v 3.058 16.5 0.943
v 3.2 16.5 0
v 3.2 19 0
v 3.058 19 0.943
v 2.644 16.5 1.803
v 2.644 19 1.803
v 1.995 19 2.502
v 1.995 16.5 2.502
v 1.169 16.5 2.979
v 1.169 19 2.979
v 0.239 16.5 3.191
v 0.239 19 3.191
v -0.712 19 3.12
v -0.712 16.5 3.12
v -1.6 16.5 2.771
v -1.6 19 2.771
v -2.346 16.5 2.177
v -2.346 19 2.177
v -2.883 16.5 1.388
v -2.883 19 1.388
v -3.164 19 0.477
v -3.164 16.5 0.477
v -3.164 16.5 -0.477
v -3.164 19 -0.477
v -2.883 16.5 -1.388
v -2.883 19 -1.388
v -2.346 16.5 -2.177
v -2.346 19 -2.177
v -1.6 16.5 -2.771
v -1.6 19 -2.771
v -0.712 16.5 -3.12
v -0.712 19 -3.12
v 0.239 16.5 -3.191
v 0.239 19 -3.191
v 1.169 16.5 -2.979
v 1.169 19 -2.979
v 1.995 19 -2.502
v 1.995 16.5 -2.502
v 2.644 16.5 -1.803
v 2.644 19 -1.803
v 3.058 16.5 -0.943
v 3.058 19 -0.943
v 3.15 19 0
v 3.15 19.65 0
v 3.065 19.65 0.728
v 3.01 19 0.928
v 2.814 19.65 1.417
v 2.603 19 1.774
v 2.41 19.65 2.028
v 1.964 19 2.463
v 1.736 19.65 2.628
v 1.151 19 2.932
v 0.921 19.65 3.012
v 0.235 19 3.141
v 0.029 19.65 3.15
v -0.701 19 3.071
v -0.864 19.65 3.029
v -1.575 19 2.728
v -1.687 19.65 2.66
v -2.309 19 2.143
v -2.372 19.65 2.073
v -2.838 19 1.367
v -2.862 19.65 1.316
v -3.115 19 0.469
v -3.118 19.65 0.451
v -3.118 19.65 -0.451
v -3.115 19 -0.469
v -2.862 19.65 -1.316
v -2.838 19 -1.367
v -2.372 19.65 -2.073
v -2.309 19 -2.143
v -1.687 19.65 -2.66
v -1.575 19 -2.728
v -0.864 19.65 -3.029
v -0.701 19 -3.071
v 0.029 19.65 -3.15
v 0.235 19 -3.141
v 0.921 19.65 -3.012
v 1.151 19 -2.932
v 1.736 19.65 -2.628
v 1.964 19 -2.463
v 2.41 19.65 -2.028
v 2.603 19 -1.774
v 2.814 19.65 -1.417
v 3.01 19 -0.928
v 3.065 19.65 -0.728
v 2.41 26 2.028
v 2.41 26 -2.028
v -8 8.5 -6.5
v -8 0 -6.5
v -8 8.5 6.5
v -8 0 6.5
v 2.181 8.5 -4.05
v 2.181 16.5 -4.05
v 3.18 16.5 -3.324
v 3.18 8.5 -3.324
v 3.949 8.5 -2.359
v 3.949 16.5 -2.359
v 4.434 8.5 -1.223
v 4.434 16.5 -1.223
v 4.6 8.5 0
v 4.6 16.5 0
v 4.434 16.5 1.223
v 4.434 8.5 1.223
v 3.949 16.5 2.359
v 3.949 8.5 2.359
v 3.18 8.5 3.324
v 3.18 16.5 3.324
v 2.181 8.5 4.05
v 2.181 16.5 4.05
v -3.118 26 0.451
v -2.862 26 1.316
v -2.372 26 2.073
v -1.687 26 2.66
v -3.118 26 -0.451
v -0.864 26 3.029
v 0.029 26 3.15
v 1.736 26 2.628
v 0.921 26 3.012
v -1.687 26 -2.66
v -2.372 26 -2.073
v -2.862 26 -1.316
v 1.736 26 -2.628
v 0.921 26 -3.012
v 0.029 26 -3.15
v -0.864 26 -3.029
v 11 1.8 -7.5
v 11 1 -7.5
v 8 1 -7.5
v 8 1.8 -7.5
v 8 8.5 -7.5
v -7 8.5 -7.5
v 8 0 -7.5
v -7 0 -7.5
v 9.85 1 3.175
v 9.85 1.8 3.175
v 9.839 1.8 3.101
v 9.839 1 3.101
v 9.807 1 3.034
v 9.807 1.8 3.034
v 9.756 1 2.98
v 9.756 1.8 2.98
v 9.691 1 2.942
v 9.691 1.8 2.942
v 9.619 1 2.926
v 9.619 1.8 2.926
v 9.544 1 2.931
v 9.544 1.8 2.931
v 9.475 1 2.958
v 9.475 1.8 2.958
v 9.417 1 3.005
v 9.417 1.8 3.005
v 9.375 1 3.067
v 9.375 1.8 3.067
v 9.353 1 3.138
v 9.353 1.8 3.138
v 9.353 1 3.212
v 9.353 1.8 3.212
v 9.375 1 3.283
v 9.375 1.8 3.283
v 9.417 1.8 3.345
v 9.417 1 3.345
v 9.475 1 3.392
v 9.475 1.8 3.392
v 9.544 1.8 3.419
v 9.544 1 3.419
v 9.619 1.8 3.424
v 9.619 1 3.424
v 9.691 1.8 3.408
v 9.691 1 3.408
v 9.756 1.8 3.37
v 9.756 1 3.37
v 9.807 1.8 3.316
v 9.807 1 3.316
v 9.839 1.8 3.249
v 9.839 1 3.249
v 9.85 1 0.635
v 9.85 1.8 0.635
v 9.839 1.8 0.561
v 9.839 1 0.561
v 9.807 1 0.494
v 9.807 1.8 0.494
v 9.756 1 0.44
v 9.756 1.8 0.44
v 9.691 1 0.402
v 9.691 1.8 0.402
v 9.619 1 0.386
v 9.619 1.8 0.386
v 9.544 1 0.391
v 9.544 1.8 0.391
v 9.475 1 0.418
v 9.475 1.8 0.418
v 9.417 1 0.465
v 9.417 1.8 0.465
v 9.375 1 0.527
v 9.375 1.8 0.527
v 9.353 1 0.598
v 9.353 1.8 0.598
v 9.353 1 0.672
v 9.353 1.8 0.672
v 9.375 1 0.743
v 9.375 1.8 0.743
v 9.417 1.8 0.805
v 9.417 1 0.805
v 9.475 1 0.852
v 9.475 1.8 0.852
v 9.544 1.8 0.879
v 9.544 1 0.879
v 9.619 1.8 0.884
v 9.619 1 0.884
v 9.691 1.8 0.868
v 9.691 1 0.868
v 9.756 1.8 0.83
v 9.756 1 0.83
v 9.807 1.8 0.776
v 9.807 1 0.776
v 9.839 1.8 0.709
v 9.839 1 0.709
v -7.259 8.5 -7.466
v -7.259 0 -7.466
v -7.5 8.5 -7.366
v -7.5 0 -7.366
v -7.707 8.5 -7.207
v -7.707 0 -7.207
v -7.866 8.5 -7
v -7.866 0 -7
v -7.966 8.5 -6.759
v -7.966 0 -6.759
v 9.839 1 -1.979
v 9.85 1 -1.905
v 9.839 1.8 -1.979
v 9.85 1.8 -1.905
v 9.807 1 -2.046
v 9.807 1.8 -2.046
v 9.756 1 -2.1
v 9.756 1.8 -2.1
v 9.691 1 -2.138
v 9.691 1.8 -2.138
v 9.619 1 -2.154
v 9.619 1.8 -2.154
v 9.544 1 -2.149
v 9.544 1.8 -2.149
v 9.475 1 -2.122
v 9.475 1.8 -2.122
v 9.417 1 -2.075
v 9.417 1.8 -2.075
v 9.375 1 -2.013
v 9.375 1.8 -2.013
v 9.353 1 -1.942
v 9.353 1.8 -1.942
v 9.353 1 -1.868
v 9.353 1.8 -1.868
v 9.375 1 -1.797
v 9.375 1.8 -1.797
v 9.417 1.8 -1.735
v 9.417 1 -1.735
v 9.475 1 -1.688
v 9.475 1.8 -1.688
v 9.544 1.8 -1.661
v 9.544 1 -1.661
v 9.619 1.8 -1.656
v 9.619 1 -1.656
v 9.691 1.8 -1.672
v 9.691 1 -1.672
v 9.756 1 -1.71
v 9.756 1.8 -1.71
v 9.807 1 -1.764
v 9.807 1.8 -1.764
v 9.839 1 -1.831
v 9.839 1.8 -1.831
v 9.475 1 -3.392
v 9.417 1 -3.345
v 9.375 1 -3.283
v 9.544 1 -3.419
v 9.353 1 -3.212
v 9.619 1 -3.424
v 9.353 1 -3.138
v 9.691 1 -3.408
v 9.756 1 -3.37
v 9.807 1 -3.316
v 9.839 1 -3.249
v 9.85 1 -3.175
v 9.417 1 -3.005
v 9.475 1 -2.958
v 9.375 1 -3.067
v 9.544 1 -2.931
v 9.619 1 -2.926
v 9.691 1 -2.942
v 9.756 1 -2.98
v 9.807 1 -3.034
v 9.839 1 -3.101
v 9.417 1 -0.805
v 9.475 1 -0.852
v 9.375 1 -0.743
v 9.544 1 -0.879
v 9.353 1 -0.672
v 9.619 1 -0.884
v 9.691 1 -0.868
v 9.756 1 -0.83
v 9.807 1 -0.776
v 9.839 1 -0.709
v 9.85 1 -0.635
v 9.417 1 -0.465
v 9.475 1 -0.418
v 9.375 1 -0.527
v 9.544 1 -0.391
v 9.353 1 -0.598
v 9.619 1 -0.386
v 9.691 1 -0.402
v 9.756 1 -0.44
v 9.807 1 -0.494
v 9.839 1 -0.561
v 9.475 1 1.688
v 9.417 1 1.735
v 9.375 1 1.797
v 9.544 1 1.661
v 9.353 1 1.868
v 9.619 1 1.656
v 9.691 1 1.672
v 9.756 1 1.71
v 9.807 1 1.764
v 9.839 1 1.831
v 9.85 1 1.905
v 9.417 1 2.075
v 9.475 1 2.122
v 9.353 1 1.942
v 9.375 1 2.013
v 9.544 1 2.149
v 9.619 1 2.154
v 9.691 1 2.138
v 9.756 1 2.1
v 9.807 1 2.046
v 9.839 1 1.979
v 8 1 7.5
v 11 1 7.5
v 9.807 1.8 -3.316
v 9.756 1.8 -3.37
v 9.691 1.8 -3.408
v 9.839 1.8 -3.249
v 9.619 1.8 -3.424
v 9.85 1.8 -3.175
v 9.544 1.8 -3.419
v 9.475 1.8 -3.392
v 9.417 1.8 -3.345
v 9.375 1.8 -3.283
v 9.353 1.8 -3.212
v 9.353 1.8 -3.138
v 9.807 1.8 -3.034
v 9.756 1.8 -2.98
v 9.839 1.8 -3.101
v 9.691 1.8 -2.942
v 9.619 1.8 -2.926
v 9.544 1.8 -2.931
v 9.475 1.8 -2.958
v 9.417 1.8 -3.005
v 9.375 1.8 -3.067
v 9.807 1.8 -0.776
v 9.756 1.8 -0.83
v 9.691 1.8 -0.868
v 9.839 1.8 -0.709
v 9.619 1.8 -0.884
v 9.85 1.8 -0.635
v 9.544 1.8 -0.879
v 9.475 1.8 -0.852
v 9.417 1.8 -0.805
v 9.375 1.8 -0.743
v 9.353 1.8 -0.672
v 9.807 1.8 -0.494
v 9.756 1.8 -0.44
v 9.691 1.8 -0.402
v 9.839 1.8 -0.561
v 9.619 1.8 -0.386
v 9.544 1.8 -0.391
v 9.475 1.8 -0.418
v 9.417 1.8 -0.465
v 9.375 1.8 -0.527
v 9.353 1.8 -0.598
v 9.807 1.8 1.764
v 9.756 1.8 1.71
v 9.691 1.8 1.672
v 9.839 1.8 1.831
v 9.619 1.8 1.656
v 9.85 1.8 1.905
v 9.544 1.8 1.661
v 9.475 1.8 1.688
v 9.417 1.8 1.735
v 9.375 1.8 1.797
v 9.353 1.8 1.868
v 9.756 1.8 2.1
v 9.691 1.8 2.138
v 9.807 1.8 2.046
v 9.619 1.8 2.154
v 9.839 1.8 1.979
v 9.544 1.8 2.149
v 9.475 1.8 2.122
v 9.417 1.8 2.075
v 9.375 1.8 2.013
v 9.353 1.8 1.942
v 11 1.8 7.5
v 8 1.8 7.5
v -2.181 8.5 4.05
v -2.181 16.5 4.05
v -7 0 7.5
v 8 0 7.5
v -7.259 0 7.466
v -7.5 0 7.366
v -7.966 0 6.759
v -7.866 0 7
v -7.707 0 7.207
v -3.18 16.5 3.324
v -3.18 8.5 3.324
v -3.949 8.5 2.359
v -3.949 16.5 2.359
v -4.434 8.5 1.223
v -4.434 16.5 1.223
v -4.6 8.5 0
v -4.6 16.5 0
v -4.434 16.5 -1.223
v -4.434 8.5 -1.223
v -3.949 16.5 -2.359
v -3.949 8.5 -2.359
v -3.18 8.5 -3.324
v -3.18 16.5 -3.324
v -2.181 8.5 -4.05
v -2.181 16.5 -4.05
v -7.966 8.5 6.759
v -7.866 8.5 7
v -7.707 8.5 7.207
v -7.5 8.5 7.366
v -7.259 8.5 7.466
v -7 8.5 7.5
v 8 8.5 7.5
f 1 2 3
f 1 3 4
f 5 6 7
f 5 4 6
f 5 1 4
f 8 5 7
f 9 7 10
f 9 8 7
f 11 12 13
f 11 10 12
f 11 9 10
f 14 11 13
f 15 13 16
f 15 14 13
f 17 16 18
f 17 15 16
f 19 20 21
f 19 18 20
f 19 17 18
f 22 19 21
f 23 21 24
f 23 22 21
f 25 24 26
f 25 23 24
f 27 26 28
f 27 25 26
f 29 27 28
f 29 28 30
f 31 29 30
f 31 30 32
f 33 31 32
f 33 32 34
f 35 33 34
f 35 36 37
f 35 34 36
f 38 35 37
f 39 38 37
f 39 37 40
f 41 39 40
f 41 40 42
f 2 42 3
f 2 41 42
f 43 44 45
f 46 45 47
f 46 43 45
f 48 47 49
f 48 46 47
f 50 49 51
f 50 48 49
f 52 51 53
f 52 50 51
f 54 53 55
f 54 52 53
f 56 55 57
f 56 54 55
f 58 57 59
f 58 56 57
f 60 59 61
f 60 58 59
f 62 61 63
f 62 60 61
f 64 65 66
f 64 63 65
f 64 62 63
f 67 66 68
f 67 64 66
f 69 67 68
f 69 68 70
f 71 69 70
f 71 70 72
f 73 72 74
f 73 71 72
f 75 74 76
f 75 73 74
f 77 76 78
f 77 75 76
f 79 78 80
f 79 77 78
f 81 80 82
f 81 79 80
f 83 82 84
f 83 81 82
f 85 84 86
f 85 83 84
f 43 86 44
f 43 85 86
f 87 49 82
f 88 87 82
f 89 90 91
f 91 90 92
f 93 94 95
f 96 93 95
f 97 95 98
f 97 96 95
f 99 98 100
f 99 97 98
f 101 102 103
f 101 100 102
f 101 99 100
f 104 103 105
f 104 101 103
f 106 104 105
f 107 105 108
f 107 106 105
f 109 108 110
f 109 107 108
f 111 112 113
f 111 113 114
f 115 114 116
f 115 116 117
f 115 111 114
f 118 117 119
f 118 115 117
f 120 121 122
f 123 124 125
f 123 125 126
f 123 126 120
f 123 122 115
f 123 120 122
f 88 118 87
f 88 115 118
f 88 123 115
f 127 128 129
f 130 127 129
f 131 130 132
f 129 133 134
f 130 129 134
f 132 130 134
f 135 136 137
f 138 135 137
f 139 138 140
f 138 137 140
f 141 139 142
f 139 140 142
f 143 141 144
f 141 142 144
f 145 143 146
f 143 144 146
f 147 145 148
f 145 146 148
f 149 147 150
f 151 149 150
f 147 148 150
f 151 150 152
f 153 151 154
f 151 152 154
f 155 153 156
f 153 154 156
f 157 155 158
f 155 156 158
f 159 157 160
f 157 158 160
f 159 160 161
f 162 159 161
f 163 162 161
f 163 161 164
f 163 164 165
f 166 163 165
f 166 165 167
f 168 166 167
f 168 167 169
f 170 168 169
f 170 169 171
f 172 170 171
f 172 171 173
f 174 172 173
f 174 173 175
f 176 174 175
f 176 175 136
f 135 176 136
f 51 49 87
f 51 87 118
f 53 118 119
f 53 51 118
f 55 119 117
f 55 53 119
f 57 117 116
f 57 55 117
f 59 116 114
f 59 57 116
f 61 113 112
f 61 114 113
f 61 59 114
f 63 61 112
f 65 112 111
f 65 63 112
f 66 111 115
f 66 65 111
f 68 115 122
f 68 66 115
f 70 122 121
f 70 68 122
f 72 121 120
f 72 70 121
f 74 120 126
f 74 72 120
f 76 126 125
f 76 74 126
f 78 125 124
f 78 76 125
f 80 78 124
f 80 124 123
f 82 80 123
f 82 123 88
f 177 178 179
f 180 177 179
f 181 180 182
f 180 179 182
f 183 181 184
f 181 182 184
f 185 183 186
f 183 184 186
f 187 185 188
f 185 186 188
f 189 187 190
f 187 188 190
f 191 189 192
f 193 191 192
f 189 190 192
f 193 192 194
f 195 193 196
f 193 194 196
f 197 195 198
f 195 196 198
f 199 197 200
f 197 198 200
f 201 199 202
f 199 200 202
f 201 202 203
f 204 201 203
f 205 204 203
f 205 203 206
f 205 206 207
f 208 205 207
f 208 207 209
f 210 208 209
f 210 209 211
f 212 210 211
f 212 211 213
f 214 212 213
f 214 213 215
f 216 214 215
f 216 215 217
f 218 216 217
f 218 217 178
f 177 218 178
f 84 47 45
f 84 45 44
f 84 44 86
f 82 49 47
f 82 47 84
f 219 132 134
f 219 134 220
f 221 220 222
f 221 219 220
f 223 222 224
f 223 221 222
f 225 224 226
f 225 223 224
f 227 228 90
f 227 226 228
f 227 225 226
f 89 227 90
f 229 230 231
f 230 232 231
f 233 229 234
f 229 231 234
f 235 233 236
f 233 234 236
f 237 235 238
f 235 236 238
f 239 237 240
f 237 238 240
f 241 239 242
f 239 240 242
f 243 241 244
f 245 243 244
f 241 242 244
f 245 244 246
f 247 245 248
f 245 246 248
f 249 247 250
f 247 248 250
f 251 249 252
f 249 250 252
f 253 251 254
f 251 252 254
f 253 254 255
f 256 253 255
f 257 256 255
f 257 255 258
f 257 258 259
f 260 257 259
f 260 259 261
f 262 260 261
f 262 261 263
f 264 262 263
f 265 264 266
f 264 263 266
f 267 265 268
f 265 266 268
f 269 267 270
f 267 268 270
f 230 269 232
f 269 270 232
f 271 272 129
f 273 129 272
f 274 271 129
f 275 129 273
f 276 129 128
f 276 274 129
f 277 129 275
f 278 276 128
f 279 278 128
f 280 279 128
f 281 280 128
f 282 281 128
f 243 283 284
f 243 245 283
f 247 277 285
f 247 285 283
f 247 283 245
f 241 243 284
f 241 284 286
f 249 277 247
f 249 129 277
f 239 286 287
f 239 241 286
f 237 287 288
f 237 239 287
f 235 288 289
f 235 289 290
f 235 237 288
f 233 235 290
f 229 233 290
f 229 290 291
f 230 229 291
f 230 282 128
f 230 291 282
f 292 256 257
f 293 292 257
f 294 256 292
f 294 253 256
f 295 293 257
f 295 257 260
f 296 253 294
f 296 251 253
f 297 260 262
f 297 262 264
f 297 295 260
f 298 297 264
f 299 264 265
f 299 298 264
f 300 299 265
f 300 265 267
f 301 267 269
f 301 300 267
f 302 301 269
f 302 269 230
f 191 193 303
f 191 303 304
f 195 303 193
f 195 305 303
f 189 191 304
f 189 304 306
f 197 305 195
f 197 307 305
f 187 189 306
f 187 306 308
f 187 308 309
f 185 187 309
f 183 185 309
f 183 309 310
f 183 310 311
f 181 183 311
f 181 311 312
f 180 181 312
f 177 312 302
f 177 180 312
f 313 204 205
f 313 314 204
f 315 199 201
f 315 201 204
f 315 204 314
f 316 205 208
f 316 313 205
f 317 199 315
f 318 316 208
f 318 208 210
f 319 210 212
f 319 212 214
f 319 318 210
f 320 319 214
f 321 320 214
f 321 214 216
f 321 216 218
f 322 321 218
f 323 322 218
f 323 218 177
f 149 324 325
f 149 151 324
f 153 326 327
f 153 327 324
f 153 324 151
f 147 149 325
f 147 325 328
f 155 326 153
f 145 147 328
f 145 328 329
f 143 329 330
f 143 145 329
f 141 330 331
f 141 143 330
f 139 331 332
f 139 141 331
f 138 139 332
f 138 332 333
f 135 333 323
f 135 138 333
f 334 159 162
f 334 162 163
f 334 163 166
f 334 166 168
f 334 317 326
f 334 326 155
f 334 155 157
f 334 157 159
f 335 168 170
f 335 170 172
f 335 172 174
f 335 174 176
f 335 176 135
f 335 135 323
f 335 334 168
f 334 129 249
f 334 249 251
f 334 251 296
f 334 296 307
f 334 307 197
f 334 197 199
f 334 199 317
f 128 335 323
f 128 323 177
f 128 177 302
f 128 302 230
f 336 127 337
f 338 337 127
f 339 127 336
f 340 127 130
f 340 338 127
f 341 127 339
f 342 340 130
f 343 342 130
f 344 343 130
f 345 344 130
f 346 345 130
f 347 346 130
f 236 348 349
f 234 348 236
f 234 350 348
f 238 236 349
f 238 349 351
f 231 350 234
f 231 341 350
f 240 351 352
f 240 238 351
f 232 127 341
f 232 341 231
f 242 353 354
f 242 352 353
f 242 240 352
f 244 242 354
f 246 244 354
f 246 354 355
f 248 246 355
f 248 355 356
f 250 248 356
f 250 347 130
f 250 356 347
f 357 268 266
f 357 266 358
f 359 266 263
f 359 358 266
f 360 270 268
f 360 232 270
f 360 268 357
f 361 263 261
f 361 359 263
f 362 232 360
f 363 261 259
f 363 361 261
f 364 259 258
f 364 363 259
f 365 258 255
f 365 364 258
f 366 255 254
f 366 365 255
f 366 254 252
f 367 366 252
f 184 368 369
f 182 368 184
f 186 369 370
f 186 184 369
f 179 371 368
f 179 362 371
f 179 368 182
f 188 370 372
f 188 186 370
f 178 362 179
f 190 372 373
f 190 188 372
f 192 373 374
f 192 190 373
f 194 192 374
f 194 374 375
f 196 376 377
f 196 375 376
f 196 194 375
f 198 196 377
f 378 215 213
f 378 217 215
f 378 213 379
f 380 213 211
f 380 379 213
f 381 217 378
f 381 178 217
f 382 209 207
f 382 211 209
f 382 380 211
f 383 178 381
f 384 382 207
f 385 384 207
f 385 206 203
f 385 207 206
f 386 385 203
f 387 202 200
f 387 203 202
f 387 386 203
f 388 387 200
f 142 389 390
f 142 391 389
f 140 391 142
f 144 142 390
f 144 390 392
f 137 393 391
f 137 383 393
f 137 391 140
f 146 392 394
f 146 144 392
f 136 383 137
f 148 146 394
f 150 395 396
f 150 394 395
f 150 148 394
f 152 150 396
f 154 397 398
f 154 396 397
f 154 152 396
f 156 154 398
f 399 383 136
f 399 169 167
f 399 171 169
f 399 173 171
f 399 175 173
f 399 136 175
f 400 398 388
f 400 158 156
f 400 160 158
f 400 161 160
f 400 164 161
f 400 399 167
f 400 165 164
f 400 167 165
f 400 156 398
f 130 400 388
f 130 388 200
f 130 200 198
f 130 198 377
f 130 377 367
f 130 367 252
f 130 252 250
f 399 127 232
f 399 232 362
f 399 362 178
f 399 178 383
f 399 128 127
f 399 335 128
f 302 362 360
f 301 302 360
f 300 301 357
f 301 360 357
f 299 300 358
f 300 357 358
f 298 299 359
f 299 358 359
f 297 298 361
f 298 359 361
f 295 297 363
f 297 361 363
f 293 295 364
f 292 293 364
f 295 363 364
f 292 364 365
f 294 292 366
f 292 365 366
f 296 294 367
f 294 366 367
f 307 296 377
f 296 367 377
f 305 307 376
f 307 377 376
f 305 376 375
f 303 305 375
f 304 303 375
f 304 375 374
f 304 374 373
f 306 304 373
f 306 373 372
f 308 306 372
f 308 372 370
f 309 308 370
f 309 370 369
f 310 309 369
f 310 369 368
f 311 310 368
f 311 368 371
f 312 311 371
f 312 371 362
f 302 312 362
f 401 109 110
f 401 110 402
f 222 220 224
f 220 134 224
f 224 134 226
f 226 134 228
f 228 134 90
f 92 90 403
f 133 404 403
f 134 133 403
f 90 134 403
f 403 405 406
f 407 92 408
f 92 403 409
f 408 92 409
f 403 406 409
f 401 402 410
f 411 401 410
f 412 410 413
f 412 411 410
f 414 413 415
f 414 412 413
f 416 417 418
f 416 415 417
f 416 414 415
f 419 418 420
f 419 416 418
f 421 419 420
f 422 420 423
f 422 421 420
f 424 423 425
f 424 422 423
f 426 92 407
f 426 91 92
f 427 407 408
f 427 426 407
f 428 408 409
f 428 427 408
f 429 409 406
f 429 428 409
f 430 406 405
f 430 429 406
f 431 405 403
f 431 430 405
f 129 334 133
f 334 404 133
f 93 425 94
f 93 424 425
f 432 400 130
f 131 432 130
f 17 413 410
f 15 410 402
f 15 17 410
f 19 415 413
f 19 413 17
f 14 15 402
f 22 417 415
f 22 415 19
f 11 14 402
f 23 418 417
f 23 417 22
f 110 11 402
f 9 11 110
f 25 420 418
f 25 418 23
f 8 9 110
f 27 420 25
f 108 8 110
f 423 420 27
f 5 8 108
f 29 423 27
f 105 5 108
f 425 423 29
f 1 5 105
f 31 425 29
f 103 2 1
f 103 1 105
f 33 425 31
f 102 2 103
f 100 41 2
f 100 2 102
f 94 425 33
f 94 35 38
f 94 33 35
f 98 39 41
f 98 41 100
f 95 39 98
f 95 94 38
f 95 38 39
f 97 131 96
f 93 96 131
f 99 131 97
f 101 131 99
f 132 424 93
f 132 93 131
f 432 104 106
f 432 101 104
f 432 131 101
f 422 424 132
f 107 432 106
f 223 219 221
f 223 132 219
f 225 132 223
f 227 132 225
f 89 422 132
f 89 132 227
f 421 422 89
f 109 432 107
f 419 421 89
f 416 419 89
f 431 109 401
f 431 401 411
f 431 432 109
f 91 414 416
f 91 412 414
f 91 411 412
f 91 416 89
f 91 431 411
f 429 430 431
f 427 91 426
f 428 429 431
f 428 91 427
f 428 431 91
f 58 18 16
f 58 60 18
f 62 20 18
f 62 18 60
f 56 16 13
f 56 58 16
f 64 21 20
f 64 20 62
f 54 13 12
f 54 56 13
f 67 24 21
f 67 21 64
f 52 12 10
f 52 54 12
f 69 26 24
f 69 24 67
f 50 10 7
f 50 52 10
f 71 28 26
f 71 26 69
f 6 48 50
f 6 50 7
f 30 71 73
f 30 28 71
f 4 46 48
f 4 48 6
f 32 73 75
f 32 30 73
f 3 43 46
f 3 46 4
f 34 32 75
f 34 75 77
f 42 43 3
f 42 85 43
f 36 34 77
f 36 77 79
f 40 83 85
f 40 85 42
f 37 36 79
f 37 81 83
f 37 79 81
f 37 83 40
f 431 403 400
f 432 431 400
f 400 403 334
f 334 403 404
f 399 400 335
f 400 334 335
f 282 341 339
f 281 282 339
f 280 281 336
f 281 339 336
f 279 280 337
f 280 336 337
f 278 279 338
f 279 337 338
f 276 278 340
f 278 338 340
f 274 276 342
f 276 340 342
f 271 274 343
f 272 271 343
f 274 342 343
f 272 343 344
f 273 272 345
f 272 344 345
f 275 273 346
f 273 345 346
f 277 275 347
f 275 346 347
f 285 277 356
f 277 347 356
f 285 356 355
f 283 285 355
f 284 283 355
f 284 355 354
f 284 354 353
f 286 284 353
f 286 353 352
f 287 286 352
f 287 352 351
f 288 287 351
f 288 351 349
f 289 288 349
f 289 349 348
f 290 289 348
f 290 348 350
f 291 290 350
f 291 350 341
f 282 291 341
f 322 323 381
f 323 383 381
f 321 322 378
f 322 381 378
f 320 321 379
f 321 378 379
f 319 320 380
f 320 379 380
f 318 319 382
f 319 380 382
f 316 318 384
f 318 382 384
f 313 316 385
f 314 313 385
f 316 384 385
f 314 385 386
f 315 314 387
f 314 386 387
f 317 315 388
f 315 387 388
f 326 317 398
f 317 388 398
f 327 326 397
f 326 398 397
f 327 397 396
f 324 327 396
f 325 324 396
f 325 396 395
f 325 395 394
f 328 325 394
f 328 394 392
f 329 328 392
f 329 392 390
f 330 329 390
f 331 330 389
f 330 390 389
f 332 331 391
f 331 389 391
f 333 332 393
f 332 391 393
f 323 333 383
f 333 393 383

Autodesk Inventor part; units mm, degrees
ref_plane "YZ Plane" through (0, 0, 0) normal (1, 0, 0) x (0, 1, 0)
ref_plane "XZ Plane" through (0, 0, 0) normal (0, 1, 0) x (-1, 0, 0)
ref_plane "XY Plane" through (0, 0, 0) normal (0, 0, 1) x (1, 0, 0)
sketch "Sketch1" plane through (0, 0, 0) normal (0, 1, 0) x (-1, 0, 0)
  line L0 (8, 7.5) -> (-8, 7.5)
  line L1 (-8, 7.5) -> (-8, -7.5)
  line L2 (-8, -7.5) -> (8, -7.5)
  line L3 (8, -7.5) -> (8, 7.5)
  point P0 (0, 0)
  dimension "d0" = 15
  dimension "d1" = 7.5
  dimension "d2" = 16
  dimension "d3" = 8
extrude "Extrusion1" add sketch "Sketch1" along normal blind 8.5
fillet "Fillet1" radius 1 2 edges at (-8, 4.25, 7.5) (-8, 4.25, -7.5)
sketch "Sketch2" plane through (8, 0, 7.5) normal (0, 0, 1) x (1, 0, 0)
  line L0 (0, 0) -> (0, 8.5) projected
  line L1 (0, 1) -> (3, 1)
  line L2 (3, 1) -> (3, 1.8)
  line L3 (3, 1.8) -> (0, 1.8)
  line L4 (0, 1.8) -> (0, 1)
  line L5 (-15, 8.5) -> (0, 8.5) projected
  line L6 (-16, 8.5) -> (-16, 0) projected
  point P0 (-8, 0)
  dimension "d7" = 0.8
  dimension "d8" = 6.7
  dimension "d9" = 19
extrude "Extrusion2" add sketch "Sketch2" against normal blind 15
sketch "Sketch3" plane through (8, 1.8, 7.5) normal (0, 1, 0) x (1, 0, 0)
  circle A0 centre (1.6, 6.865) radius 0.25
  line L0 (0, 0) -> (0, 15) construction
  line L1 (0, 9.8681) -> (0, 6.3547)
  circle A1 centre (1.6, 8.135) radius 0.25
  circle A2 centre (1.6, 9.405) radius 0.25
  circle A3 centre (1.6, 10.675) radius 0.25
  circle A4 centre (1.6, 5.595) radius 0.25
  circle A5 centre (1.6, 4.325) radius 0.25
  point P0 (-8, 7.5)
  dimension "d12" = 0.5
  dimension "d13" = 9.6
  dimension "d15" = 0.635
  dimension "d18" = 1.27
  dimension "d25" = 1.27
extrude "Extrusion3" cut sketch "Sketch3" against normal blind 15
sketch "Sketch4" plane through (0, 8.5, 0) normal (0, 1, 0) x (1, 0, 0)
  line L0 (-2.1812, 4.05) -> (2.1812, 4.05)
  line L1 (2.1812, -4.05) -> (-2.1812, -4.05)
  arc A0 (-2.1812, 4.05) -> (-2.1812, -4.05) centre (0, 0) ccw
  arc A1 (2.1812, -4.05) -> (2.1812, 4.05) centre (0, 0) ccw
  dimension "d33" = 4.05
  dimension "d34" = 8.1
extrude "Extrusion4" add sketch "Sketch4" along normal blind 8
sketch "Sketch5" plane through (0, 16.5, 0) normal (0, 1, 0) x (1, 0, 0)
  circle A0 centre (0, 0) radius 3.2
  dimension "d37" = 6.4
extrude "Extrusion5" add sketch "Sketch5" along normal blind 2.5
sketch "Sketch6" plane through (0, 19, 0) normal (0, 1, 0) x (1, 0, 0)
  circle A0 centre (0, 0) radius 3.15
  dimension "d40" = 6.3
extrude "Extrusion6" add sketch "Sketch6" along normal blind 0.65
sketch "Sketch7" plane through (0, 19.65, 0) normal (0, 1, 0) x (1, 0, 0)
  arc A0 (2.41, 2.0284) -> (2.41, -2.0284) centre (0, 0) ccw
  line L0 (2.41, -2.0284) -> (2.41, 2.0284)
  dimension "d43" = 6.3
  dimension "d44" = 5.56
extrude "Extrusion7" add sketch "Sketch7" along normal blind 6.35
properties part number "C14D32P-A3_Encoder"
